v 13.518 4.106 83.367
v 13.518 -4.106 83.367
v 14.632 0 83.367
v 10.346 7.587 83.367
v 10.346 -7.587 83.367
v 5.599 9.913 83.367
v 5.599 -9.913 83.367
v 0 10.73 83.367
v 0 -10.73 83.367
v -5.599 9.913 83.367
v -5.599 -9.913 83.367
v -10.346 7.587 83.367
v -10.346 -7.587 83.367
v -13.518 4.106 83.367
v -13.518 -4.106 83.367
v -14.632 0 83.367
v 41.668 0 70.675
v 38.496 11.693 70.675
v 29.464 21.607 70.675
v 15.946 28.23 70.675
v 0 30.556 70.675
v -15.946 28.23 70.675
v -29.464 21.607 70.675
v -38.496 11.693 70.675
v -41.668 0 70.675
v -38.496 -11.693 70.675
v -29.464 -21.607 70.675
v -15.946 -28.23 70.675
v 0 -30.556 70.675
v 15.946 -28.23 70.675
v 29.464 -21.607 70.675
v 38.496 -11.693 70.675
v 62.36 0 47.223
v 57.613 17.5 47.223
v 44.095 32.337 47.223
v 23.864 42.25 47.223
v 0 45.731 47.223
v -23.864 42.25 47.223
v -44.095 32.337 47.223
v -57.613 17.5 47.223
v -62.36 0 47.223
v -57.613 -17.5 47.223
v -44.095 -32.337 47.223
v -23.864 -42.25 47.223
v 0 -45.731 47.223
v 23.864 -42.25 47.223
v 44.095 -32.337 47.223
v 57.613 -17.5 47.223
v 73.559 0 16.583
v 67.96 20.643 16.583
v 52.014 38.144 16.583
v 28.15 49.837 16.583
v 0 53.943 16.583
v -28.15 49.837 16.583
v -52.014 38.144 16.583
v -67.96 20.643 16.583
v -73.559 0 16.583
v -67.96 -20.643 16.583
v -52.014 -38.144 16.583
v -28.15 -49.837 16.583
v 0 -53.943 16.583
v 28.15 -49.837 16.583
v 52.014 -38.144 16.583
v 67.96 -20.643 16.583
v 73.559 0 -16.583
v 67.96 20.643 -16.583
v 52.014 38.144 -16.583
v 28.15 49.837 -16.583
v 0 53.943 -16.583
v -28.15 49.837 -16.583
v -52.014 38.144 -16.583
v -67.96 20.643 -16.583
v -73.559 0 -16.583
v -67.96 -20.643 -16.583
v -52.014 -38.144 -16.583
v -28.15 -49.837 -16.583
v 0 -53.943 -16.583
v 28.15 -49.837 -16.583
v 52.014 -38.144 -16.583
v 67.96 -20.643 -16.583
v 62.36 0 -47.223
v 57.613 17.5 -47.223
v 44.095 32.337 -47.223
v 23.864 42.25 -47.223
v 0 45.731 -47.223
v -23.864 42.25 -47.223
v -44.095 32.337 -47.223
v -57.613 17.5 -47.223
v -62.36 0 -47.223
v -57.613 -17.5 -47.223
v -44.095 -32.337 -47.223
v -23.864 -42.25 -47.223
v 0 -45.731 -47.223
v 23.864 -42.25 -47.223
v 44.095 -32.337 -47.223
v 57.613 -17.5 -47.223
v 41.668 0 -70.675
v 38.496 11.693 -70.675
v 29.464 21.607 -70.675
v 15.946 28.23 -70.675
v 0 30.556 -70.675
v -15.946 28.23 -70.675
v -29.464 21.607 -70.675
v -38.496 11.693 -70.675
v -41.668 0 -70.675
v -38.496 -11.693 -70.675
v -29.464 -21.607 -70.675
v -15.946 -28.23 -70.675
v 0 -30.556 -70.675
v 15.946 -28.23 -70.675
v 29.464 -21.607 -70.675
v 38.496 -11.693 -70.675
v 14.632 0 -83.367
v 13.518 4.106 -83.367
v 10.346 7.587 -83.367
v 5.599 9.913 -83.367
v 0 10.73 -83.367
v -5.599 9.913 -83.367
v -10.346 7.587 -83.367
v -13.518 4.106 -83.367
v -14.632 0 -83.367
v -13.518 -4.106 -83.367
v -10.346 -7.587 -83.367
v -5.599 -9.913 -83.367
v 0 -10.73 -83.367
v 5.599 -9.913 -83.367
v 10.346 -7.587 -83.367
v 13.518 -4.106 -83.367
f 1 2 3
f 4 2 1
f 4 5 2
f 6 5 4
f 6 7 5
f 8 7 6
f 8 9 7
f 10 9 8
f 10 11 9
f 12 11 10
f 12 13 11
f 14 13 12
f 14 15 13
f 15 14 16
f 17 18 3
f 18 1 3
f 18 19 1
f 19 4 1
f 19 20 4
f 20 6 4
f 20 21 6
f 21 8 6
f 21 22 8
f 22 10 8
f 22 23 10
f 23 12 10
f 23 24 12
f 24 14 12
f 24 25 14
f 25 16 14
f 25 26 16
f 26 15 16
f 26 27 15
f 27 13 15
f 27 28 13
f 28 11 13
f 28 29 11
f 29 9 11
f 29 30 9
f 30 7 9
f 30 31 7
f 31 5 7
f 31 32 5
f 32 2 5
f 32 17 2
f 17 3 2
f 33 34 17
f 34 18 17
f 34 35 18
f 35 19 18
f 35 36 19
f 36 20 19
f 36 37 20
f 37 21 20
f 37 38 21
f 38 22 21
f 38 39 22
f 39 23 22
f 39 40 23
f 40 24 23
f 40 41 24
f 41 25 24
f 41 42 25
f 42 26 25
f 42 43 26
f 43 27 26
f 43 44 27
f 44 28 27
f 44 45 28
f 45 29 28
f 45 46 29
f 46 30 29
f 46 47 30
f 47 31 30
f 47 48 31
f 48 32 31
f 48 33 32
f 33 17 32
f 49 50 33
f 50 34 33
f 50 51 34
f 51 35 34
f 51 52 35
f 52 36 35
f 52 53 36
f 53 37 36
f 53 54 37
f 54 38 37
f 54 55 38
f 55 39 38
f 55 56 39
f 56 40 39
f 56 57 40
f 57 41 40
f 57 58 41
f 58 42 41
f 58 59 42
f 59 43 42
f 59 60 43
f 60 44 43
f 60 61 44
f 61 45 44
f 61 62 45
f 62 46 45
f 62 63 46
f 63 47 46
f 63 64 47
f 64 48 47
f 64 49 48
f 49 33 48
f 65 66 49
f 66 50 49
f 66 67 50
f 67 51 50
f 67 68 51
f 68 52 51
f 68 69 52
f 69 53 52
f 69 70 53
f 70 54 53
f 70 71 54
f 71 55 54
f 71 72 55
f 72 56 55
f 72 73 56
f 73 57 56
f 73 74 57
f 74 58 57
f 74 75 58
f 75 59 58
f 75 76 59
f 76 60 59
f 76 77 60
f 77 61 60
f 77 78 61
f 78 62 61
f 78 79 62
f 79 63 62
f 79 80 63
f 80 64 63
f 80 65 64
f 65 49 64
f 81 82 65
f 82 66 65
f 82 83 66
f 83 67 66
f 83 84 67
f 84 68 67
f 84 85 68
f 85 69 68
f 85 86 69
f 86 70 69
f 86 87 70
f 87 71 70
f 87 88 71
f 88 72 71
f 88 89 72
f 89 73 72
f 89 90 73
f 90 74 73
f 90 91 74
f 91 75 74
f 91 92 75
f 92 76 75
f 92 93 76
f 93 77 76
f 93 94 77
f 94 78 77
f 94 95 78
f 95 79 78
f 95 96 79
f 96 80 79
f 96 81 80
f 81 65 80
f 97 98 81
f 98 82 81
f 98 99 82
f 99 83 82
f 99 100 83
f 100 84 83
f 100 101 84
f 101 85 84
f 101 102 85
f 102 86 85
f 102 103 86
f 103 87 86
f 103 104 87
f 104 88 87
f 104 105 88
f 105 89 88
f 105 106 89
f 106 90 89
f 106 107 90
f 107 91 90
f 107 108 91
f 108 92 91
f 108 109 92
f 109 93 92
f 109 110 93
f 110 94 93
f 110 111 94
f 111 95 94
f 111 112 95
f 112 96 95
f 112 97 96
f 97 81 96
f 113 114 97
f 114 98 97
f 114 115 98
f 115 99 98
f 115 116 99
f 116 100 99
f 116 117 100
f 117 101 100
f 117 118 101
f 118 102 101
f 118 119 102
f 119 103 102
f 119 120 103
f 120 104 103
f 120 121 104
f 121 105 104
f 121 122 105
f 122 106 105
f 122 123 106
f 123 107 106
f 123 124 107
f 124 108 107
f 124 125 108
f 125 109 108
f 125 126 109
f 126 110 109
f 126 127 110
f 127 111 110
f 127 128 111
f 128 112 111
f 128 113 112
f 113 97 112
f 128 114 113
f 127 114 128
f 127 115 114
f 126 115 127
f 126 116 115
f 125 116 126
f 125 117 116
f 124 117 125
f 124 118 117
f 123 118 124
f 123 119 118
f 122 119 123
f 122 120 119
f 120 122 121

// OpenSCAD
// Generated by SolidPython 1.0.1 on 2020-07-29 00:46:52


scale(v = [15, 11, 17]) {
	sphere(r = 5);
}
/***********************************************
*********      SolidPython code:      **********
************************************************
 
# import packages: SolidPython
from solid import *
from solid.utils import *
from itertools import chain, combinations, permutations


class Resize:

    def __init__(self, scad_file):
        self.scad_file = scad_file
        #self.scad_file = import_scad(scad_file)
        # cone/cylinder param:
        self.r1 = 0
        self.r2 = 0
        self.h = 0
        # rectangular prism param:
        self.w = 0
        self.l = 0
        # ellipse param:
        self.r = 0

    # import OpenScad code (file name corresponds to shape)


    # classify shape + parameters
    def assign(self, param1, param2, param3):
        if self.scad_file == 'cone.scad':
            self.r1 = param1
            self.r2 = param2
            self.h = param3
        elif self.scad_file == 'cylinder.scad':
            self.r1 = param1
            self.r2 = param2
            self.h = param3
        elif self.scad_file == 'rectangularPrism.scad':
            self.h = param1
            self.l = param2
            self.w = param3
        else:
            self.r = param1
            self.h = param2

    # resize parameters
    def iterate(self):
        x = range(3, 20, 2)
        i = 1
        if self.scad_file == 'cone.scad':
            tempList = list(permutations(x, 2))
            for temp in tempList:
                param1 = temp[0]
                param2 = temp[1]
                filepath = 'produced_scad_files/' + 'cone' + str(param1) + '_' + str(param2) + '_' + '.scad'
                scad_render_to_file(cylinder(h=param1, r1=param2, r2=0), filepath)

        elif self.scad_file == 'cylinder.scad':
            tempList = list(permutations(x, 3))
            for temp in tempList:
                param1 = temp[0]
                param2 = temp[1]
                filepath = 'produced_scad_files/' + 'cylinder' + str(param1) + '_' + str(param2) + '_' + '.scad'
                scad_render_to_file(cylinder(h=param1, r1=param2, r2=param2), filepath)

        elif self.scad_file == 'rectangularPrism.scad':
            tempList = list(permutations(x, 3))
            for temp in tempList:
                param1 = temp[0]
                param2 = temp[1]
                param3 = temp[2]
                filepath = 'produced_scad_files/' + 'rectangularPrism' + str(param1) + '_' + str(param2) + '_' + str(
                    param3) + '.scad'
                scad_render_to_file(cube(size=(param1, param2, param3)), filepath)

        elif self.scad_file == 'ellipse.scad':
            tempList = list(permutations(x, 4))
            for temp in tempList:
                param1 = temp[0]
                param2 = temp[1]
                param3 = temp[2]
                param4 = temp[3]
                filepath = 'produced_scad_files/' + 'ellipse' + str(param1) + '_' + str(param2) + '_' + str(param3) + '_' + str(param4) + '.scad'
                scad_render_to_file(scale([param1, param2, param3])(sphere(r=param4)), filepath)

    def render_to_scadfile(self):
        scad_render_to_file(scad, 'example.scad') 
 
************************************************/
